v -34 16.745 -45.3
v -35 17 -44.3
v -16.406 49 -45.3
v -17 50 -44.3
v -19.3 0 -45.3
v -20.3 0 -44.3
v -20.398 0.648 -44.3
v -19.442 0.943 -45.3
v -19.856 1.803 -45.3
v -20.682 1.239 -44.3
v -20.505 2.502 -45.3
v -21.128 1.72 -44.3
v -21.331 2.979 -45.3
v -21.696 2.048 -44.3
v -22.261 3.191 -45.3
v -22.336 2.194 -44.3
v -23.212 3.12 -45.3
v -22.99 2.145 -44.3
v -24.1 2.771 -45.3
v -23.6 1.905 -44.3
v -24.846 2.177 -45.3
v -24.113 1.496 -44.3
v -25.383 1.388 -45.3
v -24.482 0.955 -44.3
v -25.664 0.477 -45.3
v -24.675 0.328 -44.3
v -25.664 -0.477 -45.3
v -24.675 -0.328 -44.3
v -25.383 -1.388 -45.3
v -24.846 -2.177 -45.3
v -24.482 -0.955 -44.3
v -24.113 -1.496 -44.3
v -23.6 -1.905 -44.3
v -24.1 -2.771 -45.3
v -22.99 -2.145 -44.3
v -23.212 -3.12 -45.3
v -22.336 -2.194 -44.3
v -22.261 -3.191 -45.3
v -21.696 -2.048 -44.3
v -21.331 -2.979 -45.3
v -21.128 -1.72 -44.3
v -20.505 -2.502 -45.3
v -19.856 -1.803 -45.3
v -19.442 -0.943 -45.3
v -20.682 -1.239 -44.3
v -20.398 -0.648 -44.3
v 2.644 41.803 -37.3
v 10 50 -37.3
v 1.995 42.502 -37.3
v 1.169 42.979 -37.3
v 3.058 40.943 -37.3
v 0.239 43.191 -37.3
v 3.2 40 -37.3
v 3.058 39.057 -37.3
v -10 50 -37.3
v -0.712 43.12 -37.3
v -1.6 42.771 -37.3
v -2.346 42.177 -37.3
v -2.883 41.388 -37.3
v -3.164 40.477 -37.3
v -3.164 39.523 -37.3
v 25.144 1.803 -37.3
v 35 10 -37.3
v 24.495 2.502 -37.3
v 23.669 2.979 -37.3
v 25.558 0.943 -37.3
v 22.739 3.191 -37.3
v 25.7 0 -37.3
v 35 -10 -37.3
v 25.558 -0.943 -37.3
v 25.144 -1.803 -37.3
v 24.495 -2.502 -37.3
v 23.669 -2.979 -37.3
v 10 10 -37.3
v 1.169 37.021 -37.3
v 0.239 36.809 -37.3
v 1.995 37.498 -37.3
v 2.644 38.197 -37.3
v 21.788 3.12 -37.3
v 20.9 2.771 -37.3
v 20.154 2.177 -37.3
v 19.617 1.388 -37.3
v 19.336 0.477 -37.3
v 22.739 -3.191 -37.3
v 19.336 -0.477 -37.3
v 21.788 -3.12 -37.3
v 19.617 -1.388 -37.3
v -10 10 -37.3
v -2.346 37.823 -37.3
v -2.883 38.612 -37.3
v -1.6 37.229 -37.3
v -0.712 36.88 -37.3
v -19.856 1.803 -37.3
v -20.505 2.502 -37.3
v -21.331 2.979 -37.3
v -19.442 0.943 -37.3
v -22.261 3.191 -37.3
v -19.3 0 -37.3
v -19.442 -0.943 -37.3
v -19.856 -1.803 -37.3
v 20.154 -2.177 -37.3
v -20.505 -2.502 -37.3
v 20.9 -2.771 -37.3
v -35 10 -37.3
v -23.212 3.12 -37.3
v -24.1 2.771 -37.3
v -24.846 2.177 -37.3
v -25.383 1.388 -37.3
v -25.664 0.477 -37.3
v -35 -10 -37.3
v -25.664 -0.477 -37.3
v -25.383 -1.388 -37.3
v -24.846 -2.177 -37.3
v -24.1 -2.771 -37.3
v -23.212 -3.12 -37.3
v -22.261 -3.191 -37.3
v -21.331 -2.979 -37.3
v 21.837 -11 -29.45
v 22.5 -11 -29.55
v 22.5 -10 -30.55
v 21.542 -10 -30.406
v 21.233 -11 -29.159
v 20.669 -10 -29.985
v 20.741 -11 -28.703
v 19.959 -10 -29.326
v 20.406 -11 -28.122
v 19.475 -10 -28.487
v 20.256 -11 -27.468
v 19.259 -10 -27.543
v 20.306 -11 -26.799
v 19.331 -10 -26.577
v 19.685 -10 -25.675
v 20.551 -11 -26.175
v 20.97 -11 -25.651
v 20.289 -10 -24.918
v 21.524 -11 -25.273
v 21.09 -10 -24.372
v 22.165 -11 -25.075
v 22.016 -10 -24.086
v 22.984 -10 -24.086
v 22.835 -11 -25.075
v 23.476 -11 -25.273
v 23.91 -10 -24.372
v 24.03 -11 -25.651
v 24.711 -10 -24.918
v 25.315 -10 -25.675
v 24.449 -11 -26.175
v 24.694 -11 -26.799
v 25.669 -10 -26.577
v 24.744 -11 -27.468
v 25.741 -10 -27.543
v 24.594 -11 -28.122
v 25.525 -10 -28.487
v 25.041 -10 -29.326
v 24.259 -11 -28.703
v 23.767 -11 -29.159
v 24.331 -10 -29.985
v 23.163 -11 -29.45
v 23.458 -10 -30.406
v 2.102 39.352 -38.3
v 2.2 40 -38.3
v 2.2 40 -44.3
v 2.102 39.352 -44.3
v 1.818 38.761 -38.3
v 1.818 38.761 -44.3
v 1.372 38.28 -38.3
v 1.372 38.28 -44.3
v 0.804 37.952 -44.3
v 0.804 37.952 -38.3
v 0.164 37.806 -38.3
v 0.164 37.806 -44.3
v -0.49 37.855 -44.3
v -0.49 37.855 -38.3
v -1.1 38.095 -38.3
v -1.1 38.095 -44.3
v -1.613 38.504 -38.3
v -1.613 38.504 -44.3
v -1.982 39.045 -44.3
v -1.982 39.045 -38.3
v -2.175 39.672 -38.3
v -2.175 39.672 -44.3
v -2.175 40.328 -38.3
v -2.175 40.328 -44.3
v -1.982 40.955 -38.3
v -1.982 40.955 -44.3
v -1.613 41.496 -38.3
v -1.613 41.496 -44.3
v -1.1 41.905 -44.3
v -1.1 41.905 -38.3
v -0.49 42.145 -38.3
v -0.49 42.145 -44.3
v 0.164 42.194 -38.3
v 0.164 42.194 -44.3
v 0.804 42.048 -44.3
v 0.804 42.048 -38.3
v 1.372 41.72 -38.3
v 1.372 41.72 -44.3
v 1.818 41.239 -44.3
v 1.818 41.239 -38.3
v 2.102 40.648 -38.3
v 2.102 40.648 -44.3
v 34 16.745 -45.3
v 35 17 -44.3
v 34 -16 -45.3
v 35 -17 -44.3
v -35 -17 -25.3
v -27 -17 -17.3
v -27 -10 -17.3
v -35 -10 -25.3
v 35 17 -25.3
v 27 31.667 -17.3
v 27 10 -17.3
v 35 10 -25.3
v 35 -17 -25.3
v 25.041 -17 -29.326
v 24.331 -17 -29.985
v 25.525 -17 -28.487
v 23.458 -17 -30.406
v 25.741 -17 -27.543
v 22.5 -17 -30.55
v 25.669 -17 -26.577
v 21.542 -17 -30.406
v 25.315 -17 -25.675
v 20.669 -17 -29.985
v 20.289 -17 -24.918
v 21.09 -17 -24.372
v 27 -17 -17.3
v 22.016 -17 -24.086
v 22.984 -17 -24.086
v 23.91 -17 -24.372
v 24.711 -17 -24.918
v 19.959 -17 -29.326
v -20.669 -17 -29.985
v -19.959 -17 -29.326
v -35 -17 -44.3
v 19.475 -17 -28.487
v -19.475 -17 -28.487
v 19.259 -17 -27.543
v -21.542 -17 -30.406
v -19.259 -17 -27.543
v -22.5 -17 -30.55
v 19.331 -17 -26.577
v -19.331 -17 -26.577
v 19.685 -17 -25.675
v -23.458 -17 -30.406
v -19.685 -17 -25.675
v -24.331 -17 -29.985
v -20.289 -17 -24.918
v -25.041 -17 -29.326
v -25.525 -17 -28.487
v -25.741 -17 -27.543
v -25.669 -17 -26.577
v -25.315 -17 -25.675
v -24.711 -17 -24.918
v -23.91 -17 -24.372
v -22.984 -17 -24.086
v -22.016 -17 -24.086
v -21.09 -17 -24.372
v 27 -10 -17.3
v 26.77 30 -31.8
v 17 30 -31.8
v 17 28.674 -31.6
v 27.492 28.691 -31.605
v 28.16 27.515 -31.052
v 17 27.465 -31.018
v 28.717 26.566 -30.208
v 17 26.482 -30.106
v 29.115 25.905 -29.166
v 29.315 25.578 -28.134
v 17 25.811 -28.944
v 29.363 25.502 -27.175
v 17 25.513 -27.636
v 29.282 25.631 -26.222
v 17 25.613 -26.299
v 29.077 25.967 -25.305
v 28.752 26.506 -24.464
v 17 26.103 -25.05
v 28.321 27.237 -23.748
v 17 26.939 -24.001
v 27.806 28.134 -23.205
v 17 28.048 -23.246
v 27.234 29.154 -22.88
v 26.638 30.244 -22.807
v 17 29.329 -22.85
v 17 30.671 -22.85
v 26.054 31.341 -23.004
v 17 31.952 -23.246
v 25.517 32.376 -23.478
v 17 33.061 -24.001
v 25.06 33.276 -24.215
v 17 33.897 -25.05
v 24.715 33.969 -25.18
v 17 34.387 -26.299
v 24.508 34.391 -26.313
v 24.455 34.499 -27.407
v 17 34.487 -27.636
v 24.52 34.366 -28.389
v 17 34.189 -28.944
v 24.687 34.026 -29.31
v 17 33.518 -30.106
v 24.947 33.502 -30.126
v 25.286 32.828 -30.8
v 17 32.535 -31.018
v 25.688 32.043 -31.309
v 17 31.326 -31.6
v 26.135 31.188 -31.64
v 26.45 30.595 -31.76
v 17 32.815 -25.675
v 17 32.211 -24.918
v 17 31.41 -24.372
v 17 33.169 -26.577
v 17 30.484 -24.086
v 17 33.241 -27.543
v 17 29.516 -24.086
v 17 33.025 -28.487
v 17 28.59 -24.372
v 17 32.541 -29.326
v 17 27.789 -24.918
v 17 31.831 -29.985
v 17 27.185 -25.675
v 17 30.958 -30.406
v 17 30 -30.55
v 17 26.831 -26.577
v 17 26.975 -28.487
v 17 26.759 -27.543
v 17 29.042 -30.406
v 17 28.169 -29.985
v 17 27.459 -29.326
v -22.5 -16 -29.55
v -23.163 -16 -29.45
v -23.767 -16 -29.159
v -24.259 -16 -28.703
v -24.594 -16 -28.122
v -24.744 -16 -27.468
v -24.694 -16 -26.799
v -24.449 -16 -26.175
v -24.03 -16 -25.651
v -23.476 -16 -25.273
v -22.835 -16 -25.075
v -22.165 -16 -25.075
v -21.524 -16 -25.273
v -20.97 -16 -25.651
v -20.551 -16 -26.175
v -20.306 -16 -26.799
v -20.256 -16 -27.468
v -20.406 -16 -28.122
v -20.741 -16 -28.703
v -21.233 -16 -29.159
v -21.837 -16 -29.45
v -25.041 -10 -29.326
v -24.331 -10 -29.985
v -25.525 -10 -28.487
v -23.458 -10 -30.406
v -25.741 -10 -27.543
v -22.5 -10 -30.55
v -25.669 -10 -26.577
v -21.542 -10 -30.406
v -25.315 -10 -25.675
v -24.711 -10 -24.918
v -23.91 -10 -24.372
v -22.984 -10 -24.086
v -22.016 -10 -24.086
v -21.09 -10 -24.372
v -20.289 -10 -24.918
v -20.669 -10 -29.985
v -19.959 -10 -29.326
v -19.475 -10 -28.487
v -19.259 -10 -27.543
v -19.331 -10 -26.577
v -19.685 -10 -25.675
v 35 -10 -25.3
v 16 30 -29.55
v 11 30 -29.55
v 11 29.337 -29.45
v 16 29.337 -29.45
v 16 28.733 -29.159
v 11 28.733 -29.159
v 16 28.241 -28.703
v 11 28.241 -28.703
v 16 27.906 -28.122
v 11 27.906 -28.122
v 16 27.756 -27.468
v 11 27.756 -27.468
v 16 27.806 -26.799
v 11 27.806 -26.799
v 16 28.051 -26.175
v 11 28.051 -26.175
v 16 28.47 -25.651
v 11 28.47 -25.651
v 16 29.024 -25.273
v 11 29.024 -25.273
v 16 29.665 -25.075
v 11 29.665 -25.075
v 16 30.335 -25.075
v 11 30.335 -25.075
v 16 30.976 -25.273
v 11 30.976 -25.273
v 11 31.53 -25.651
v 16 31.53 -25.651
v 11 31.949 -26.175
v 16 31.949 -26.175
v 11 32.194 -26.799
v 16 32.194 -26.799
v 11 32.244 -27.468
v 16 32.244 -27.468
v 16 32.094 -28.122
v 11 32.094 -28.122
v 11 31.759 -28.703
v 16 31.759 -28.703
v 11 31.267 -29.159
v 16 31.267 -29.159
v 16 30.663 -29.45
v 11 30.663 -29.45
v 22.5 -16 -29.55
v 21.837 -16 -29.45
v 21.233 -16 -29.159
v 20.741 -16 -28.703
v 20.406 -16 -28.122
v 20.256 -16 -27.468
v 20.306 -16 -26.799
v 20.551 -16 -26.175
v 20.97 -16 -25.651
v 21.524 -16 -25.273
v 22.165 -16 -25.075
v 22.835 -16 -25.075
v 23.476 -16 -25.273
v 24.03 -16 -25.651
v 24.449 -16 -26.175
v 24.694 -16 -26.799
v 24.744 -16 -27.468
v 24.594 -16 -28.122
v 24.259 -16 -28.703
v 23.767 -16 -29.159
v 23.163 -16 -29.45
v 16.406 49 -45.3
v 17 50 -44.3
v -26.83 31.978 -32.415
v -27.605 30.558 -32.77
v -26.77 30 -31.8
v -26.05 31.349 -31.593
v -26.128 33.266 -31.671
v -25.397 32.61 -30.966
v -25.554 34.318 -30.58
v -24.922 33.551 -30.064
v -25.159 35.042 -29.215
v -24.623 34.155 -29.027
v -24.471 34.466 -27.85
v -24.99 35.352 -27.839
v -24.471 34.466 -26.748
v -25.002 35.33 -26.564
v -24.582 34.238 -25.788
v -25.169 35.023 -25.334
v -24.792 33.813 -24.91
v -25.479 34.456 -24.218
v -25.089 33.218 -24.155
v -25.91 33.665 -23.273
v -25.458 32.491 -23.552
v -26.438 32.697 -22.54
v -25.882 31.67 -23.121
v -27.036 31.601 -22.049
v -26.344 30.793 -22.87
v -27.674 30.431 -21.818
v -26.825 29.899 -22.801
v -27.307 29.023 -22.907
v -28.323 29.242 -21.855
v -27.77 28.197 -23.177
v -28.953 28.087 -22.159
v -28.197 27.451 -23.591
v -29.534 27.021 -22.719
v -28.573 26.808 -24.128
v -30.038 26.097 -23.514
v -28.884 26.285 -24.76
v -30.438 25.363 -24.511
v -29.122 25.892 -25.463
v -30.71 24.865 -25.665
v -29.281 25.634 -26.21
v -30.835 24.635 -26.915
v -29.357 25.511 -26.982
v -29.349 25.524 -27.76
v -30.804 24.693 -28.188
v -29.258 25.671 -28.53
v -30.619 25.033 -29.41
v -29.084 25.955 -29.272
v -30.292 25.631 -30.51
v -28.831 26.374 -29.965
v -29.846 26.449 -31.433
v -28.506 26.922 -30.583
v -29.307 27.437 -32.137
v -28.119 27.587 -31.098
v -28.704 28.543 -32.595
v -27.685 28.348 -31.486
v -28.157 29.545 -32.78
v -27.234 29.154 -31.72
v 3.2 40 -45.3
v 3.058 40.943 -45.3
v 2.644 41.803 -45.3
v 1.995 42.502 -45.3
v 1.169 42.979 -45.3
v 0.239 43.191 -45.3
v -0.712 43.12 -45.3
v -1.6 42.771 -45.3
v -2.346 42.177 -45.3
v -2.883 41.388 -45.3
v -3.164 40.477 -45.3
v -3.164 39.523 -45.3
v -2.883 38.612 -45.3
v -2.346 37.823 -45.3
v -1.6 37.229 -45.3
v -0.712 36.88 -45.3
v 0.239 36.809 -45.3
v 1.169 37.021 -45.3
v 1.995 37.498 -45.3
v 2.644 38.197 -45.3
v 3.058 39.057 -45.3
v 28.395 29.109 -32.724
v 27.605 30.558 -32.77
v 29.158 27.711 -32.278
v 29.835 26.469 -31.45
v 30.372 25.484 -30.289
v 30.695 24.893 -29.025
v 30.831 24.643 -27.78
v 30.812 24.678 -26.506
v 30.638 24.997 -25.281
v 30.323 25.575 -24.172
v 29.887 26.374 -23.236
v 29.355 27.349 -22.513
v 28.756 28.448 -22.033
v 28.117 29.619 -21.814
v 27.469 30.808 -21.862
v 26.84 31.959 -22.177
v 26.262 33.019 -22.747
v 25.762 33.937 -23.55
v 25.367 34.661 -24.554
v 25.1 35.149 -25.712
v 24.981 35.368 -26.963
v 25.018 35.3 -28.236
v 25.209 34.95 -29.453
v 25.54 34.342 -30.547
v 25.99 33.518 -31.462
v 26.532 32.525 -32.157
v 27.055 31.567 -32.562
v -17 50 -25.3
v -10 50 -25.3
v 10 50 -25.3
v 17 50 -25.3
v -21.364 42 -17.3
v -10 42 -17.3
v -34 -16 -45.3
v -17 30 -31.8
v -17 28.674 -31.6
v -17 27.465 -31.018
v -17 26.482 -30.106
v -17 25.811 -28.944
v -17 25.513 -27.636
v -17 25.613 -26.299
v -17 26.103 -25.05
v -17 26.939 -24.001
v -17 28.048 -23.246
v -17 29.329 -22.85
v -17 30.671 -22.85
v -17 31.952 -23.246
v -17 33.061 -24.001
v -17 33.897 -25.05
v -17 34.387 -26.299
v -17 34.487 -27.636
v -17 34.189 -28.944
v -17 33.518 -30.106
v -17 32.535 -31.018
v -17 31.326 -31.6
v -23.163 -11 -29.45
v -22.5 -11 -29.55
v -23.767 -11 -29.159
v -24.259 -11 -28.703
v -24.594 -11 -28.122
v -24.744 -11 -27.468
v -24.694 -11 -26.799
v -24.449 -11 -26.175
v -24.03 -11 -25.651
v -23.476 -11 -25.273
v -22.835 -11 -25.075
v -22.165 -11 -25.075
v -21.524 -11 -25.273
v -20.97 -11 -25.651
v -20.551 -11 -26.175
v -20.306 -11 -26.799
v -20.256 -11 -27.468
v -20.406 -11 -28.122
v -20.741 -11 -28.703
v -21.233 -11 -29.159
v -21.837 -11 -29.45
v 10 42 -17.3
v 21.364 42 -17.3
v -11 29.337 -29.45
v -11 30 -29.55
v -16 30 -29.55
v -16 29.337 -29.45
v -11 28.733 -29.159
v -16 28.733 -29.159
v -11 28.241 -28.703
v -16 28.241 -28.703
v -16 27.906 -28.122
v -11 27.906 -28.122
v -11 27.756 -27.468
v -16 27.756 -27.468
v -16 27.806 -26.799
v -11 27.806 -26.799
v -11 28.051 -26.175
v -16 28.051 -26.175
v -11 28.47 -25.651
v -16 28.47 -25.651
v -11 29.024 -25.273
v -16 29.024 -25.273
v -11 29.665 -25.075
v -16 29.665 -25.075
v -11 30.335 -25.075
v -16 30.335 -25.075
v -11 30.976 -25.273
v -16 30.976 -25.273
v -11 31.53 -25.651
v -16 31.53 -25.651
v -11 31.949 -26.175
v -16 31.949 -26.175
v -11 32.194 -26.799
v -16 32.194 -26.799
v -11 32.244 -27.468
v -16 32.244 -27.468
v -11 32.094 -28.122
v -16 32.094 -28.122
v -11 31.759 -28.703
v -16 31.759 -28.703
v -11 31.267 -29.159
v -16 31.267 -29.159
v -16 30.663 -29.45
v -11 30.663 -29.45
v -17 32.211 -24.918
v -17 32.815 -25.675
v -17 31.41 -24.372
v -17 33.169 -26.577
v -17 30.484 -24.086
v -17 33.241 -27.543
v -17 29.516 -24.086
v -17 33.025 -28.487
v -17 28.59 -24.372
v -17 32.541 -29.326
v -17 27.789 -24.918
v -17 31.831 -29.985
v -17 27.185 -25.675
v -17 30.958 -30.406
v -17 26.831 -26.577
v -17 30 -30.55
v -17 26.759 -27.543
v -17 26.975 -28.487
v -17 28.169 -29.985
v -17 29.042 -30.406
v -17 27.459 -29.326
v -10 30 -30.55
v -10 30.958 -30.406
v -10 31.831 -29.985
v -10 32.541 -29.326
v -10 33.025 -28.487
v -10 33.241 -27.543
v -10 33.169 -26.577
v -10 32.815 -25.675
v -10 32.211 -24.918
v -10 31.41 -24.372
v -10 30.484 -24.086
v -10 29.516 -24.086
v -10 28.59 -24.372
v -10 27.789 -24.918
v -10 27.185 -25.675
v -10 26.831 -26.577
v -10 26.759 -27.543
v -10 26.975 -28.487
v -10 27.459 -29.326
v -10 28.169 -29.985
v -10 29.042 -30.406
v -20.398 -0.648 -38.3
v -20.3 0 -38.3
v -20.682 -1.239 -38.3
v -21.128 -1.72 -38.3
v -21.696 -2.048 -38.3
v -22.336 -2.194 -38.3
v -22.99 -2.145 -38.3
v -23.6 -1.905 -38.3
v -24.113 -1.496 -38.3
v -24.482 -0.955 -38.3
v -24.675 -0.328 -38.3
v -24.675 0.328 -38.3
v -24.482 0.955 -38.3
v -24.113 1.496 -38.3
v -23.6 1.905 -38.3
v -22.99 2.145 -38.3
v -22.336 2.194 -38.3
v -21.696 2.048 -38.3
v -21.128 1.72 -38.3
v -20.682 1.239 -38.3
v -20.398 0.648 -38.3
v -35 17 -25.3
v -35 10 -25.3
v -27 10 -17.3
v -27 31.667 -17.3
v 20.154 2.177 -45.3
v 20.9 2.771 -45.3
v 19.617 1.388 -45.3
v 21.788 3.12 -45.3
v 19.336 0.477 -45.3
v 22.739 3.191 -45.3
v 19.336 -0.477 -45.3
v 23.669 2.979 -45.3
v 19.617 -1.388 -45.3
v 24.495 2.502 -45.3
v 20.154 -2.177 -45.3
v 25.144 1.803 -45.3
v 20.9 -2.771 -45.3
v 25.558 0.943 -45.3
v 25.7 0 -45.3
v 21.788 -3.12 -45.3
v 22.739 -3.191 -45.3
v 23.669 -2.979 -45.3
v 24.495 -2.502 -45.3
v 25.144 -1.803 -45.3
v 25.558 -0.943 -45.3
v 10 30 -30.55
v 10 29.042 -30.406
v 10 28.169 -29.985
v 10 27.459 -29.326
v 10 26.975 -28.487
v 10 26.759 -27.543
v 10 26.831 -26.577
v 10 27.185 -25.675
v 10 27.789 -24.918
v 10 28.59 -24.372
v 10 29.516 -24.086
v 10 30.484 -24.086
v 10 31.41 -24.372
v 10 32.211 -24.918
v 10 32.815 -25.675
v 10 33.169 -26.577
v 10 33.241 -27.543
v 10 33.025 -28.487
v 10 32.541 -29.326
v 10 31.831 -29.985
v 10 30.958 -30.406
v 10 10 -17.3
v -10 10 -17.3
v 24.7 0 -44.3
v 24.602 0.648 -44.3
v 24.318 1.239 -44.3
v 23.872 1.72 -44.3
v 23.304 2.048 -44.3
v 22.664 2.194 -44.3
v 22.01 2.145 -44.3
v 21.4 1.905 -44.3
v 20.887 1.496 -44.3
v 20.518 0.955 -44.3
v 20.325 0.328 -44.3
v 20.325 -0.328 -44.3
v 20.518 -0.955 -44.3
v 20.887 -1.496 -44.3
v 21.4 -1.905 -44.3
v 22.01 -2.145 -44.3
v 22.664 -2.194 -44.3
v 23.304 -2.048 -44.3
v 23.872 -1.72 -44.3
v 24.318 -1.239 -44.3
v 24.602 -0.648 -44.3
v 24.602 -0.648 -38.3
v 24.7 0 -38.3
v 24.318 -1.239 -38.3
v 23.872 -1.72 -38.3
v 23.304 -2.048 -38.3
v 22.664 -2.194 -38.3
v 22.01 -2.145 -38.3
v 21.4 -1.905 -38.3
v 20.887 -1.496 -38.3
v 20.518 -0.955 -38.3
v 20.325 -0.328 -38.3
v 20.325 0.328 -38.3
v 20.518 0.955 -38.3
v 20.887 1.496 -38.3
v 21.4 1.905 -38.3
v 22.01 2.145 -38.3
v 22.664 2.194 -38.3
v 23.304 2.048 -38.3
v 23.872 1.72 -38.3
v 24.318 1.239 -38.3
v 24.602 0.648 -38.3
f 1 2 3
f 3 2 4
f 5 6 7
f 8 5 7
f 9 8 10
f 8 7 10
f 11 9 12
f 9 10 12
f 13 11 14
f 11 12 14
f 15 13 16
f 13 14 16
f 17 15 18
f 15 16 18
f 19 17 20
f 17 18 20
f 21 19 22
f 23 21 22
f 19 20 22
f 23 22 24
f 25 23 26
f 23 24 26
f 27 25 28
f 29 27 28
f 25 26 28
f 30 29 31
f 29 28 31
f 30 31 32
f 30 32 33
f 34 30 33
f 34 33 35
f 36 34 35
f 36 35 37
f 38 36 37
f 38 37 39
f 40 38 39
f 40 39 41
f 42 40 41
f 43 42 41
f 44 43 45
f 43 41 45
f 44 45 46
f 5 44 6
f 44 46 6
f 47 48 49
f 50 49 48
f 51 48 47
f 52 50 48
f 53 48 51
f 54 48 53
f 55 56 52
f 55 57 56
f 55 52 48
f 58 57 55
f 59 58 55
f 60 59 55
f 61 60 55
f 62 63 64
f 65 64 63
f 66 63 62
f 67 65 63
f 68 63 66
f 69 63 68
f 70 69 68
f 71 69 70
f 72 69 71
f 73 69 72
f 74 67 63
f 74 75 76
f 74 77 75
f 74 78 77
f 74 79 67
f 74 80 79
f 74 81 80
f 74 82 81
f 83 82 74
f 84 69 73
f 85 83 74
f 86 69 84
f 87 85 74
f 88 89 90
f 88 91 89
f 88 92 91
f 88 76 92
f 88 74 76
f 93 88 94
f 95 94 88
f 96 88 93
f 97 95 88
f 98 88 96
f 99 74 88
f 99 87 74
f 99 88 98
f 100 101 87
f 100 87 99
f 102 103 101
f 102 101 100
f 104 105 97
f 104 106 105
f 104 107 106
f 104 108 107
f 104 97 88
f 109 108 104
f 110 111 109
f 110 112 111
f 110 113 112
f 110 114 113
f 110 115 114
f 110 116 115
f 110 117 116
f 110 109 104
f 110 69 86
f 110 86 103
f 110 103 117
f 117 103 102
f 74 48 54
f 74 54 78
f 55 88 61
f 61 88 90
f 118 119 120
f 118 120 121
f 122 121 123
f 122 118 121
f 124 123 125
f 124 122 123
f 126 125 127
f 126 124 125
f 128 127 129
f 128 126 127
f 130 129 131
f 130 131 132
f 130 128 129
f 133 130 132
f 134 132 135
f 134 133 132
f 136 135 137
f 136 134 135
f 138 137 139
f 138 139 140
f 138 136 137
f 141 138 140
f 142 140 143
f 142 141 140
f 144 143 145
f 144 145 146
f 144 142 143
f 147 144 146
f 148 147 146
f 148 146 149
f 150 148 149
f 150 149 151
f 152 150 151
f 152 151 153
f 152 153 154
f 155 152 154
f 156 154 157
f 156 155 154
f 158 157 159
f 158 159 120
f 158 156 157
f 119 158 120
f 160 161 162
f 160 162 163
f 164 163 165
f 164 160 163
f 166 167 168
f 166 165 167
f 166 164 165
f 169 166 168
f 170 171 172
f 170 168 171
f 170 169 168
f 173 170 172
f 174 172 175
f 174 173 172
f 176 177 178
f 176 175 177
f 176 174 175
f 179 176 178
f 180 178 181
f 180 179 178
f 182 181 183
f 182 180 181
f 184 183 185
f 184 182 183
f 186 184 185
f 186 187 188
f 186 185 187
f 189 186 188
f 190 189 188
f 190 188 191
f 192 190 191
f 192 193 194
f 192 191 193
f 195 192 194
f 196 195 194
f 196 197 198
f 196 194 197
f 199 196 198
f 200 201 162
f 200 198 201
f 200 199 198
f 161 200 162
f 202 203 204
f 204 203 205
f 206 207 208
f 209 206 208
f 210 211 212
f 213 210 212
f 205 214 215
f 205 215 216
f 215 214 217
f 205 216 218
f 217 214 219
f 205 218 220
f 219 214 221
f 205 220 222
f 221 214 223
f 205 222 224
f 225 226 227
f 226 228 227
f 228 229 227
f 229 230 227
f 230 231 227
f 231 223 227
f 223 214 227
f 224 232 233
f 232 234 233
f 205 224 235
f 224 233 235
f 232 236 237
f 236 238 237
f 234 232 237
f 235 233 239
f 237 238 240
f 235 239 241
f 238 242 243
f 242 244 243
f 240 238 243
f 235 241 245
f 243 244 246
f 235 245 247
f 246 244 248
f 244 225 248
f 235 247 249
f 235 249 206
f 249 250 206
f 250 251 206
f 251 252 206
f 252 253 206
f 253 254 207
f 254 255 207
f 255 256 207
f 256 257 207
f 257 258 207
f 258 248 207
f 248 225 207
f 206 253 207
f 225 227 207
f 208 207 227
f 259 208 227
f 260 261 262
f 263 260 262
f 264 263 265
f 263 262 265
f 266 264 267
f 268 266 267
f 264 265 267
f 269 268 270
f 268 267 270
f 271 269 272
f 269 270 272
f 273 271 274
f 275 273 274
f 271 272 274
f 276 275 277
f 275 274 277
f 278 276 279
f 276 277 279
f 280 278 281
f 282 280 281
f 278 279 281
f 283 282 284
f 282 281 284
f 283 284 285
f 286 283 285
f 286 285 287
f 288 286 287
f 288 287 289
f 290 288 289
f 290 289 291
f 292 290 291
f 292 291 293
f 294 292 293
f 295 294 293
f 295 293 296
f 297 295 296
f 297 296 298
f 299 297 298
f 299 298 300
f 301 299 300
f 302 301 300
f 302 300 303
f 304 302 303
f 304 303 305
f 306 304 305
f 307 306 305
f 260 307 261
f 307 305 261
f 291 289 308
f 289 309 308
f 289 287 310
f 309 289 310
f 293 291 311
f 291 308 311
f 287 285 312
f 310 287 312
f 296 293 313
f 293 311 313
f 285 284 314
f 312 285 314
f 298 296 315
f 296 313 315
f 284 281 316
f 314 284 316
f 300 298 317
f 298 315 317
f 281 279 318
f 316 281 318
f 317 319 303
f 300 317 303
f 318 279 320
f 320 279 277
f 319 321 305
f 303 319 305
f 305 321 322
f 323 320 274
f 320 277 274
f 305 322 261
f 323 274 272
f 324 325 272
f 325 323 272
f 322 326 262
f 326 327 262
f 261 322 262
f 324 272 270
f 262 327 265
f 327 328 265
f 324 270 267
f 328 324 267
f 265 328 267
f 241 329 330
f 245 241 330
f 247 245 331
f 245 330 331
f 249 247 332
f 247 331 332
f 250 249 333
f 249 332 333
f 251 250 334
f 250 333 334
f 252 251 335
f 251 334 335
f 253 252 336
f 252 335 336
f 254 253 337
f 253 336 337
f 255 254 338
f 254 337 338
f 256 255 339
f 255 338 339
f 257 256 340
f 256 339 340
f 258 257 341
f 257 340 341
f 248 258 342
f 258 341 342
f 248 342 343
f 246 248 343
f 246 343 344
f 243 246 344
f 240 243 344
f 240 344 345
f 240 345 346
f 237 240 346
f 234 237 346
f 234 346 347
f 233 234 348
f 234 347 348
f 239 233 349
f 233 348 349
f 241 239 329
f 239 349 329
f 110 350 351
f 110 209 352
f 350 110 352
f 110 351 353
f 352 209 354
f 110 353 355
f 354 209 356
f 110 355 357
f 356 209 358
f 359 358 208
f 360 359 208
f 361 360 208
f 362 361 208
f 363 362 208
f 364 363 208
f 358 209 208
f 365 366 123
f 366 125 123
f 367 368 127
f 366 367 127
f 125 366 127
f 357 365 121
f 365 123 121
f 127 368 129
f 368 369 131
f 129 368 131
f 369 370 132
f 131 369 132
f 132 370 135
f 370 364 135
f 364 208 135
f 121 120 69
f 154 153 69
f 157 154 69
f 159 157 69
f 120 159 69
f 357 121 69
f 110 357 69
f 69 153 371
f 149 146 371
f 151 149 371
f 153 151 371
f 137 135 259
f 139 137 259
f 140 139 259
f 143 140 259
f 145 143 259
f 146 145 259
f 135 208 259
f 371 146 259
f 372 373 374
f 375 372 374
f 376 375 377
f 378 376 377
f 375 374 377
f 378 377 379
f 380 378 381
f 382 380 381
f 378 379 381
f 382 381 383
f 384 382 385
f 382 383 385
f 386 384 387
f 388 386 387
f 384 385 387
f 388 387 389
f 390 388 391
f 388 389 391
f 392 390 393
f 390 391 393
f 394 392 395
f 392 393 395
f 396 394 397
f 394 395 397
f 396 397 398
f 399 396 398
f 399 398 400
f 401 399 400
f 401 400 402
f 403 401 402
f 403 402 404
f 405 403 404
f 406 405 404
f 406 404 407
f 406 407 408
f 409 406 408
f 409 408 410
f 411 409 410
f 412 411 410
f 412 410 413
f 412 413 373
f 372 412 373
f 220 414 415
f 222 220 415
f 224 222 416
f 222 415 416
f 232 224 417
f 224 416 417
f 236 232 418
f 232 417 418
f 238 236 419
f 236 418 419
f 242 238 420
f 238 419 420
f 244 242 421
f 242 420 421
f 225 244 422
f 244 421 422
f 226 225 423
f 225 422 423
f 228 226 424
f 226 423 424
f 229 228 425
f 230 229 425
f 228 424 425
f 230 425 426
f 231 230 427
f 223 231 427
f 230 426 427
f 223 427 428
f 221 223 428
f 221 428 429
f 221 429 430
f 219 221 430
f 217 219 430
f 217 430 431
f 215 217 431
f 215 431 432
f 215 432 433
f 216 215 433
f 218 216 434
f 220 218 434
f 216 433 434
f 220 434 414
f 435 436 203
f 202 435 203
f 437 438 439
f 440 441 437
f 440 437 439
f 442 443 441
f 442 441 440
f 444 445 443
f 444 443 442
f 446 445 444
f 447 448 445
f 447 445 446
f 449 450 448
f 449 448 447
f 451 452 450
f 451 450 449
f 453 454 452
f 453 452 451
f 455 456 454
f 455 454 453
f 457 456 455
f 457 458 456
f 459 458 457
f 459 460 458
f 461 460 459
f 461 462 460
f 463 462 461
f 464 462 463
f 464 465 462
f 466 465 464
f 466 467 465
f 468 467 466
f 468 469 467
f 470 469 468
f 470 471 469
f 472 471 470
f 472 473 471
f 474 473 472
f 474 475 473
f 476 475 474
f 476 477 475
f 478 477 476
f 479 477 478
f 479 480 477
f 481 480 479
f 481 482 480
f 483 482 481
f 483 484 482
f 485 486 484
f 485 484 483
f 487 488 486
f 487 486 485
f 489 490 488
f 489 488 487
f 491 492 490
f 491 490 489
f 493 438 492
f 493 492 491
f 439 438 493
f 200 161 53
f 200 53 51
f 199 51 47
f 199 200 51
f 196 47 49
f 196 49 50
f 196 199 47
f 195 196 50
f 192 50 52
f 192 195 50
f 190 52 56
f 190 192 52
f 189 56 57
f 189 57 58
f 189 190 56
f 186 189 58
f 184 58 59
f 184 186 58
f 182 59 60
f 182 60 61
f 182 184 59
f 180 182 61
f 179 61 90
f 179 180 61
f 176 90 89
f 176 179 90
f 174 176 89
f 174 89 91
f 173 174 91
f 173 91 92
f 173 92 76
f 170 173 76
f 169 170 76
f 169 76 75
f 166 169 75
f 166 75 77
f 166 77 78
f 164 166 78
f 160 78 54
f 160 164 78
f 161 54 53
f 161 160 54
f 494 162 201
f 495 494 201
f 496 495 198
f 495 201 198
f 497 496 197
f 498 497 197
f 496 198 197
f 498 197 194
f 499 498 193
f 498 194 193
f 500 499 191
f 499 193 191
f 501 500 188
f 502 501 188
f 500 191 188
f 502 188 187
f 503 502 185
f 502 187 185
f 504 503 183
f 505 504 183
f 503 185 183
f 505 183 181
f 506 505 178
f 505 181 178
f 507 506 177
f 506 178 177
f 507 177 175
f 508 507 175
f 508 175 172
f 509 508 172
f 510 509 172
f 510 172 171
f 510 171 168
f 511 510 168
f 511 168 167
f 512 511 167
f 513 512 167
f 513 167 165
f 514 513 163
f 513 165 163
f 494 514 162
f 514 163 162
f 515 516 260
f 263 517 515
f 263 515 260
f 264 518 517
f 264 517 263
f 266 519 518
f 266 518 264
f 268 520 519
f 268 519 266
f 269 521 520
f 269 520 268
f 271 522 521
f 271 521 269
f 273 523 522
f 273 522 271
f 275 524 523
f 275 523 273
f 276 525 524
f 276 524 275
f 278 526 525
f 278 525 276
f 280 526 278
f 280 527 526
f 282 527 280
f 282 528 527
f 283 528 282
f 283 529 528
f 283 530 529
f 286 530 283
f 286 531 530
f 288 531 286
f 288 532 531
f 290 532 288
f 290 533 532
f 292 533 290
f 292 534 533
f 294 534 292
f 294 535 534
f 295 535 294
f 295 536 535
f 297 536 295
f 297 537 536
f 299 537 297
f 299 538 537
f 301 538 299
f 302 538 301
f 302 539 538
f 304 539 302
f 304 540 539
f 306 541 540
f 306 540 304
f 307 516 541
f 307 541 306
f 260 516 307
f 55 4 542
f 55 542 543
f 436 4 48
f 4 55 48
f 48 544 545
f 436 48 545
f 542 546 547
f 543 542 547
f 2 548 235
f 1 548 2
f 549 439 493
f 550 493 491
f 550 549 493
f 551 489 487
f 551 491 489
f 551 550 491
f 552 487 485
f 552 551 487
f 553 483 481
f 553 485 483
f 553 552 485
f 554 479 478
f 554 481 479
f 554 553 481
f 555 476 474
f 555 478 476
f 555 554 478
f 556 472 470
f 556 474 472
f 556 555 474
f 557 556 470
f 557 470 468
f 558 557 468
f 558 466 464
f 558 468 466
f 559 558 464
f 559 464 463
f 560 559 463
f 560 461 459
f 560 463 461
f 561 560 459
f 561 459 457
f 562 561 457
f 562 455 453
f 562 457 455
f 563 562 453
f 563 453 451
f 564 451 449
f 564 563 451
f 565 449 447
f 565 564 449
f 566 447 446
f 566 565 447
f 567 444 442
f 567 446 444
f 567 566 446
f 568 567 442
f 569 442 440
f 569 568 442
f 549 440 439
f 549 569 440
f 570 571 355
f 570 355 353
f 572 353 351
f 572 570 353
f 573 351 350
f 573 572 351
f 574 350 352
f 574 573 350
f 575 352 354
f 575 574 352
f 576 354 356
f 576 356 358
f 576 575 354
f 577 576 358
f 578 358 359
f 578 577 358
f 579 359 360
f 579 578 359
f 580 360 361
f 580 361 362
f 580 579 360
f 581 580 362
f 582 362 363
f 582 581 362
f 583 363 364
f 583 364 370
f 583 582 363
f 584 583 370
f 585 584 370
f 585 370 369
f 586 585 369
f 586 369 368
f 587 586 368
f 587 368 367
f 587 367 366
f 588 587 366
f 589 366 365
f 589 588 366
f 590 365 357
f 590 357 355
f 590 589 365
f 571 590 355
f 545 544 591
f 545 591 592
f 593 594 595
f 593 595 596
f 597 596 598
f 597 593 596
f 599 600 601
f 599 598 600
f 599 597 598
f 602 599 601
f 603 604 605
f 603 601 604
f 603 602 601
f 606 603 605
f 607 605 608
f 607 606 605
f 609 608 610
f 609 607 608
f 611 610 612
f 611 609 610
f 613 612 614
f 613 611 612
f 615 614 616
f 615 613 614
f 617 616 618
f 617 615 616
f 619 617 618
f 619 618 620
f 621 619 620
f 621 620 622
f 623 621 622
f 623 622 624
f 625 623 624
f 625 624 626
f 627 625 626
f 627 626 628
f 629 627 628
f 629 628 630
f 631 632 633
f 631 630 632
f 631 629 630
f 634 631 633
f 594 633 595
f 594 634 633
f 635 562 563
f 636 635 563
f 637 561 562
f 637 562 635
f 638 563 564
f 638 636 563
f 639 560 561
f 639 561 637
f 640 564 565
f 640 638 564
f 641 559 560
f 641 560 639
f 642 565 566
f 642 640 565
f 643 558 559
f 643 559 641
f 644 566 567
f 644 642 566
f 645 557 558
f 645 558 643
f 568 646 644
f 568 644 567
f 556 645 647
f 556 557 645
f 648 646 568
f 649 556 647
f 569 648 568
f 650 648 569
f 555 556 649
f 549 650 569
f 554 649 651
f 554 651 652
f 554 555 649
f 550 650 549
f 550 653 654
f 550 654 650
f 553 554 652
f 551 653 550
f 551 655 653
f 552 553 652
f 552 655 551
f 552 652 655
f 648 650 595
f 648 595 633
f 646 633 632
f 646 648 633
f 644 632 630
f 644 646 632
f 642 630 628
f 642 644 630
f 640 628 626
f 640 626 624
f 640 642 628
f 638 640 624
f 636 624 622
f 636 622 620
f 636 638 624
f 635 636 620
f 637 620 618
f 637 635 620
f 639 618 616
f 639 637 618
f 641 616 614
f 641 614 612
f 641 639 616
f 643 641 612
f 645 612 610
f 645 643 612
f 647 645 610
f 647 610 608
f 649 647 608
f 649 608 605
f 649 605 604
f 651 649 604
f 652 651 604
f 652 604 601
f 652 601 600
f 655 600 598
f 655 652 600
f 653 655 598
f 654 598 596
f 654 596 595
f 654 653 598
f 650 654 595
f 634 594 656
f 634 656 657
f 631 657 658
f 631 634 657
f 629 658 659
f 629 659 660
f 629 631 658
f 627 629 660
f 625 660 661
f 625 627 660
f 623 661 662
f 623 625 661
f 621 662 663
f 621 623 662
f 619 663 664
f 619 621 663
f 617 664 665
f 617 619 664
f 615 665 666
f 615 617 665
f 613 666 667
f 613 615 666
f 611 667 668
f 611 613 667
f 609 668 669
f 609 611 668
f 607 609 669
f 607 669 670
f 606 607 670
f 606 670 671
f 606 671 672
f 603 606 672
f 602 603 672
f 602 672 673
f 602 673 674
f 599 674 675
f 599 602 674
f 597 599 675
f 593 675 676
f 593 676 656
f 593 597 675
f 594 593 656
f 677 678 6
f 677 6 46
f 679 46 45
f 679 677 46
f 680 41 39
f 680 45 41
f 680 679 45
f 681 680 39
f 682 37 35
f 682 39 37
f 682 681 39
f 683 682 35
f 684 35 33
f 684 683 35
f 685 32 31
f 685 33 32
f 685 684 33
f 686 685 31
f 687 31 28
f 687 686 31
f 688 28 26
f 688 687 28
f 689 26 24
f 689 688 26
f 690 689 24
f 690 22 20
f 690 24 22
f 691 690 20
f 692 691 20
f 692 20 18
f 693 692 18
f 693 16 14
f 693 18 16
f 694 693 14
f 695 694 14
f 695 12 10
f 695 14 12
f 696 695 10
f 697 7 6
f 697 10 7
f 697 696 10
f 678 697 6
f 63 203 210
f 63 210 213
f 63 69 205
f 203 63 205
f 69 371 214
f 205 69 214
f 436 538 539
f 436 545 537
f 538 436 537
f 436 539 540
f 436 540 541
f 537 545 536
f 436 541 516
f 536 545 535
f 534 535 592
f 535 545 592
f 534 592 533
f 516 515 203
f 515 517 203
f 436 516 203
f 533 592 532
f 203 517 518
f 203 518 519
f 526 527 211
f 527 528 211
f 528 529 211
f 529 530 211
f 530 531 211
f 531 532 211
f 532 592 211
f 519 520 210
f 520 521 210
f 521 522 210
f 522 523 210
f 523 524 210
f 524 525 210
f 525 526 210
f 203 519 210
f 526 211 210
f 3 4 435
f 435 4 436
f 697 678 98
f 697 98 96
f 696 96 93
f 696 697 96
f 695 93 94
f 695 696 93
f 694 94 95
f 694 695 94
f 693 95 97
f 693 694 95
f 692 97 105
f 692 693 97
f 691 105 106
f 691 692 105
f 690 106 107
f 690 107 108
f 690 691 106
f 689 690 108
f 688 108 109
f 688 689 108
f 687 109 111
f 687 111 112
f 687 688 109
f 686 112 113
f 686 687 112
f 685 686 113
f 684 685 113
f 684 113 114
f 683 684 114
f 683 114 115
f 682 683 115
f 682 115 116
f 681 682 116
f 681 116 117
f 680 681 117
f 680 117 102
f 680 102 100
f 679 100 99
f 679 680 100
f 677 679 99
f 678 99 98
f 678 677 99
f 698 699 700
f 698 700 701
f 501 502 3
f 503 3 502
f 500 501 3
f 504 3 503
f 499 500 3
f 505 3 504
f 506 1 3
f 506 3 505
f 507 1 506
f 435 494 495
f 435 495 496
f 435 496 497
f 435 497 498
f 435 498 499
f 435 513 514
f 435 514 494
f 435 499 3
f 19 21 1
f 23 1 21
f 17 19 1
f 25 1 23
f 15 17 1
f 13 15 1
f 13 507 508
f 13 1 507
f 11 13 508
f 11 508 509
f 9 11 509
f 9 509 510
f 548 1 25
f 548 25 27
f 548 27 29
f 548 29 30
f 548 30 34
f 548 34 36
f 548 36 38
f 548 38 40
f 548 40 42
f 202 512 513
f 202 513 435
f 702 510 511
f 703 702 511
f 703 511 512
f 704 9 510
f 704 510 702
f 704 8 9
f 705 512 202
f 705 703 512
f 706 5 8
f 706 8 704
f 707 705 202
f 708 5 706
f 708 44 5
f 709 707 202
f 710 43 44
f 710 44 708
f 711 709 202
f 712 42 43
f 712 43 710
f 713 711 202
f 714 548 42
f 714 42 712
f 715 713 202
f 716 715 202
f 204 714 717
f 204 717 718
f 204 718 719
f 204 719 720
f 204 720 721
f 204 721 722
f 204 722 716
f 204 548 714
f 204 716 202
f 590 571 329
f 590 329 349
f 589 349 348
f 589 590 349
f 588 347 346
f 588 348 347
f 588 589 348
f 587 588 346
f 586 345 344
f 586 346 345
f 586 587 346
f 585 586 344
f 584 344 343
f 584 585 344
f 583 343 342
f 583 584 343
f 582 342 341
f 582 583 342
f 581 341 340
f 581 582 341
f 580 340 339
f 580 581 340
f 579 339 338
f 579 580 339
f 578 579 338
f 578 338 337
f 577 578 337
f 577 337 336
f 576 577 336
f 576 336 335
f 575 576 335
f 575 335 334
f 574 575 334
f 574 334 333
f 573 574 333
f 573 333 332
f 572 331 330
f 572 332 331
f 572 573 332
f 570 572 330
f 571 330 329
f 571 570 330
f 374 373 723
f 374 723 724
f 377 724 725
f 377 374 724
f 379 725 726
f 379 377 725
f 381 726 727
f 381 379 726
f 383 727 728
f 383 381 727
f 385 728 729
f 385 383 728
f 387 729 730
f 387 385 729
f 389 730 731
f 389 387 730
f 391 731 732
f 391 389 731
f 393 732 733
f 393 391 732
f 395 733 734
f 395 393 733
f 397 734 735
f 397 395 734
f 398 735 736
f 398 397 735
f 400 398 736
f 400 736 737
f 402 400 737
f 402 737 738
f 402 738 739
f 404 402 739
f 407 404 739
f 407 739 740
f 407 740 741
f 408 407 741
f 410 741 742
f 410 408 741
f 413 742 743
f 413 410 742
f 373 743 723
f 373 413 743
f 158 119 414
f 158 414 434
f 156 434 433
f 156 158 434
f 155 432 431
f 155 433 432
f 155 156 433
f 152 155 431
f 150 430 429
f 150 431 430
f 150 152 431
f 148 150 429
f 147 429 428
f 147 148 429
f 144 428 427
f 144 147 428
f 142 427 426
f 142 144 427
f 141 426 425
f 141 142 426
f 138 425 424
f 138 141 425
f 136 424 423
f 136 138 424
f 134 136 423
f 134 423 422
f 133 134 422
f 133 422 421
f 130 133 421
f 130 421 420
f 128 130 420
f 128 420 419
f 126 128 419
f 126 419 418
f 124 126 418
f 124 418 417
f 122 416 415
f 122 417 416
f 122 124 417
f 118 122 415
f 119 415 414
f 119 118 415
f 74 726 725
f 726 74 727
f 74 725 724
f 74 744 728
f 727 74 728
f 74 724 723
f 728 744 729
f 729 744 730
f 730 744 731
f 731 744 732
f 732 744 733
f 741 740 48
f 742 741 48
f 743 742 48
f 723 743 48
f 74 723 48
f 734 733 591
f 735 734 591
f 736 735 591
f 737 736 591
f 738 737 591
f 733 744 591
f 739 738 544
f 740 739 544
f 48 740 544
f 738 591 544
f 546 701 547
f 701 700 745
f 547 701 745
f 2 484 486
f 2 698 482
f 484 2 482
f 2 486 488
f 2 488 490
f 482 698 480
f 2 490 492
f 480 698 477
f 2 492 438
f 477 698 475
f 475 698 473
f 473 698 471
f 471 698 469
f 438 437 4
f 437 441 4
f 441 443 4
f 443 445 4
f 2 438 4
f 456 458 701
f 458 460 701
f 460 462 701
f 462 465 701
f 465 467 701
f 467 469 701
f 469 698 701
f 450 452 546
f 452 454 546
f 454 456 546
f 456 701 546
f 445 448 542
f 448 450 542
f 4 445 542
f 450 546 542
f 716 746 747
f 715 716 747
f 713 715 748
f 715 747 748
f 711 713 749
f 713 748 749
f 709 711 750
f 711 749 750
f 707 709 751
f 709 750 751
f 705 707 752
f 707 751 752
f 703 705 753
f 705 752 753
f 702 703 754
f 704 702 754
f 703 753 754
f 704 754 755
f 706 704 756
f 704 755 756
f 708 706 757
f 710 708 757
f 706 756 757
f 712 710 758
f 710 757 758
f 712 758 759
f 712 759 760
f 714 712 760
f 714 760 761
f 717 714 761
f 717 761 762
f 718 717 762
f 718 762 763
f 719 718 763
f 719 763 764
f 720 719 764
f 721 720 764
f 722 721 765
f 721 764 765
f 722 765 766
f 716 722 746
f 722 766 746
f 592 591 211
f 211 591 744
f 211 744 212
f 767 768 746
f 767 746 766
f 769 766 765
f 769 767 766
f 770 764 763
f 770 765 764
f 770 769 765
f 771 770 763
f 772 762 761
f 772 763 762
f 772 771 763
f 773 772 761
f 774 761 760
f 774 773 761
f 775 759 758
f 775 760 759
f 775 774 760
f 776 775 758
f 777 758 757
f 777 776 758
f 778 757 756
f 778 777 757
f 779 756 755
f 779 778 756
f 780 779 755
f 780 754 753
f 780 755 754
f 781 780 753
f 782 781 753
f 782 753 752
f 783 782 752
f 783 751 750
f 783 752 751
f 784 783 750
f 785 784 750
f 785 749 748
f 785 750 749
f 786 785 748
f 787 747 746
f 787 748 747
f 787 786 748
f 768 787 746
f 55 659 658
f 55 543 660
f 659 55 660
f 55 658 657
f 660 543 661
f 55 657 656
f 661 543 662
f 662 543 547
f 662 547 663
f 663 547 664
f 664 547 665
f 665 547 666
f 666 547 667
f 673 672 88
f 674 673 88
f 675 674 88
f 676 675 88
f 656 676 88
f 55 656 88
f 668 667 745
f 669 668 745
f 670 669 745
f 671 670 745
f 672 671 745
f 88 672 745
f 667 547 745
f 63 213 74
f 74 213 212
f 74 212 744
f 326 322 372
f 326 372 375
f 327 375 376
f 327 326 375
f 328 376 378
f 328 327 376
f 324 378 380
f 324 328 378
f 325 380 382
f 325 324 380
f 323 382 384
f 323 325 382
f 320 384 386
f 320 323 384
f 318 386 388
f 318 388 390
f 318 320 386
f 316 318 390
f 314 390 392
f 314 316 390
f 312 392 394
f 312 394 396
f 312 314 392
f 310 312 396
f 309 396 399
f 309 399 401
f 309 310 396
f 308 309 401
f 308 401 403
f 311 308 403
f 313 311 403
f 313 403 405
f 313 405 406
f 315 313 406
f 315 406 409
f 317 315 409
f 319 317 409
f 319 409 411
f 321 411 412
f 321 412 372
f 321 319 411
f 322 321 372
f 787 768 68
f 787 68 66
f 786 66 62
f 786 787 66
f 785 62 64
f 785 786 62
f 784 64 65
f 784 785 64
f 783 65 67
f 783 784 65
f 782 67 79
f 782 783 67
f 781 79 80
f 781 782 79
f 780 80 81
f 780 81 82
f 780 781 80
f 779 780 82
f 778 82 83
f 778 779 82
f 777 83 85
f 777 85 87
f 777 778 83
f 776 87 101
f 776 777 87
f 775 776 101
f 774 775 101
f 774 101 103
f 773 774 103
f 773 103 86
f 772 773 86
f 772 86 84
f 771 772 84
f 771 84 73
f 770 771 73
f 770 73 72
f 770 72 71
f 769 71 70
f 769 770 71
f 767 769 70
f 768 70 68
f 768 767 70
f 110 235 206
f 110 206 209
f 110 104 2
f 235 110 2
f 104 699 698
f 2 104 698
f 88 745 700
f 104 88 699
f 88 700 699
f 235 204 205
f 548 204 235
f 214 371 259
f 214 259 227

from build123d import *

# Parameters (mm, degrees)
PAD014_DEPTH            = 28
POCKET008_DEPTH         = 20
SKETCH024_R             = 2.2
POCKET009_DEPTH         = 28.001
SKETCH025_R             = 2.25
POCKET010_DEPTH         = 17.001
SKETCH026_R             = 2.25
POCKET011_DEPTH         = 35.001
POCKET011_DEPTH_BACK    = 35.001
SKETCH027_R             = 4.5
POCKET012_DEPTH         = 219.723582
CHAMFER005_SIZE         = 8
CHAMFER006_SIZE         = 1
BODY008_PITCH_ANGLE     = 90
BODY008_PLACEMENT_ANGLE = -90


with BuildPart() as part:
    # Sketch022 → Pad014 (new body)
    with BuildSketch(Plane.YZ):
        Polygon((-35, 17), (-35, -17), (-17, -50), (17, -50), (35, -17), (35, 17), align=None)
    extrude(amount=PAD014_DEPTH)

    # Sketch023 → Pocket008 (cut)
    with BuildSketch(Plane.YZ):
        Polygon((-35, 10), (35, 10), (35, -10), (10, -10), (10, -50), (-10, -50), (-10, -10), (-35, -10), align=None)
    extrude(amount=POCKET008_DEPTH, mode=Mode.SUBTRACT)

    # Sketch024 → Pocket009 (cut, through all)
    with BuildSketch(Plane.YZ):
        with Locations((-22.5, 0)):
            Circle(SKETCH024_R)
        with Locations((22.5, 0)):
            Circle(SKETCH024_R)
        with Locations((0, -40)):
            Circle(SKETCH024_R)
    extrude(amount=POCKET009_DEPTH, mode=Mode.SUBTRACT)

    # Sketch025 → Pocket010 (cut, through all)
    with BuildSketch(Plane.XY):
        with Locations((10, 22.5)):
            Circle(SKETCH025_R)
        with Locations((10, -22.5)):
            Circle(SKETCH025_R)
    extrude(amount=POCKET010_DEPTH, mode=Mode.SUBTRACT)

    # Sketch026 → Pocket011 (cut, two sides)
    with BuildSketch(Plane.XZ) as pocket011_sk:
        with Locations((10, -30)):
            Circle(SKETCH026_R)
    extrude(amount=-POCKET011_DEPTH, mode=Mode.SUBTRACT)
    extrude(pocket011_sk.sketch, amount=POCKET011_DEPTH_BACK, mode=Mode.SUBTRACT)

    # Sketch027 (on Plane of DatumPlane) → Pocket012 (cut, through all)
    with BuildSketch(Plane.XZ.offset(-17)):
        with Locations((10, -30)):
            Circle(SKETCH027_R)
    pocket012 = extrude(amount=-POCKET012_DEPTH, mode=Mode.SUBTRACT)

    # Mirrored002: Pocket012 across XZ
    add(pocket012.mirror(Plane.XZ), mode=Mode.SUBTRACT)

    # Chamfer005
    chamfer005_edges = [part.edges().sort_by_distance(p)[0] for p in [
        (0, -35, 13.5),
        (0, 35, 13.5),
        (0, -13.5, -50),
        (0, 13.5, -50),
        (0, 35, -13.5),
        (0, -35, -13.5),
    ]]
    chamfer(chamfer005_edges, length=CHAMFER005_SIZE)

    # Chamfer006
    chamfer006_edges = [part.edges().sort_by_distance(p)[0] for p in [
        (28, -35, 0),
        (28, 0, 17),
        (28, -26, -33.5),
        (28, 35, 0),
        (28, 0, -50),
        (28, 26, -33.5),
        (28, 20.3, 0),
        (28, -2.2, -40),
        (28, -24.7, 0),
        (7.75, -22.5, 17),
        (7.75, 22.5, 17),
        (7.75, 22.5, 10),
        (7.75, -22.5, 10),
        (7.75, 10, -30),
        (7.75, -10, -30),
        (7.75, -17, -30),
        (7.75, 17, -30),
        (5.5, 27.909049, -30.000078),
        (5.5, -27.909133, -29.999922),
        (20, -2.2, -40),
        (20, 20.3, 0),
        (20, -24.7, 0),
    ]]
    chamfer(chamfer006_edges, length=CHAMFER006_SIZE)


with BuildPart() as part_1:
    # Body008 pitch: moved
    add(part.part.rotate(Axis((0, 0, 0), (0, 1, 0)), BODY008_PITCH_ANGLE))


with BuildPart() as part_2:
    # Body008 placement: moved
    add(part_1.part.moved(Location((0, 0, -17.3))).rotate(Axis((0, 0, -17.3), (0, 0, 1)), BODY008_PLACEMENT_ANGLE))


solid = part_2.part
